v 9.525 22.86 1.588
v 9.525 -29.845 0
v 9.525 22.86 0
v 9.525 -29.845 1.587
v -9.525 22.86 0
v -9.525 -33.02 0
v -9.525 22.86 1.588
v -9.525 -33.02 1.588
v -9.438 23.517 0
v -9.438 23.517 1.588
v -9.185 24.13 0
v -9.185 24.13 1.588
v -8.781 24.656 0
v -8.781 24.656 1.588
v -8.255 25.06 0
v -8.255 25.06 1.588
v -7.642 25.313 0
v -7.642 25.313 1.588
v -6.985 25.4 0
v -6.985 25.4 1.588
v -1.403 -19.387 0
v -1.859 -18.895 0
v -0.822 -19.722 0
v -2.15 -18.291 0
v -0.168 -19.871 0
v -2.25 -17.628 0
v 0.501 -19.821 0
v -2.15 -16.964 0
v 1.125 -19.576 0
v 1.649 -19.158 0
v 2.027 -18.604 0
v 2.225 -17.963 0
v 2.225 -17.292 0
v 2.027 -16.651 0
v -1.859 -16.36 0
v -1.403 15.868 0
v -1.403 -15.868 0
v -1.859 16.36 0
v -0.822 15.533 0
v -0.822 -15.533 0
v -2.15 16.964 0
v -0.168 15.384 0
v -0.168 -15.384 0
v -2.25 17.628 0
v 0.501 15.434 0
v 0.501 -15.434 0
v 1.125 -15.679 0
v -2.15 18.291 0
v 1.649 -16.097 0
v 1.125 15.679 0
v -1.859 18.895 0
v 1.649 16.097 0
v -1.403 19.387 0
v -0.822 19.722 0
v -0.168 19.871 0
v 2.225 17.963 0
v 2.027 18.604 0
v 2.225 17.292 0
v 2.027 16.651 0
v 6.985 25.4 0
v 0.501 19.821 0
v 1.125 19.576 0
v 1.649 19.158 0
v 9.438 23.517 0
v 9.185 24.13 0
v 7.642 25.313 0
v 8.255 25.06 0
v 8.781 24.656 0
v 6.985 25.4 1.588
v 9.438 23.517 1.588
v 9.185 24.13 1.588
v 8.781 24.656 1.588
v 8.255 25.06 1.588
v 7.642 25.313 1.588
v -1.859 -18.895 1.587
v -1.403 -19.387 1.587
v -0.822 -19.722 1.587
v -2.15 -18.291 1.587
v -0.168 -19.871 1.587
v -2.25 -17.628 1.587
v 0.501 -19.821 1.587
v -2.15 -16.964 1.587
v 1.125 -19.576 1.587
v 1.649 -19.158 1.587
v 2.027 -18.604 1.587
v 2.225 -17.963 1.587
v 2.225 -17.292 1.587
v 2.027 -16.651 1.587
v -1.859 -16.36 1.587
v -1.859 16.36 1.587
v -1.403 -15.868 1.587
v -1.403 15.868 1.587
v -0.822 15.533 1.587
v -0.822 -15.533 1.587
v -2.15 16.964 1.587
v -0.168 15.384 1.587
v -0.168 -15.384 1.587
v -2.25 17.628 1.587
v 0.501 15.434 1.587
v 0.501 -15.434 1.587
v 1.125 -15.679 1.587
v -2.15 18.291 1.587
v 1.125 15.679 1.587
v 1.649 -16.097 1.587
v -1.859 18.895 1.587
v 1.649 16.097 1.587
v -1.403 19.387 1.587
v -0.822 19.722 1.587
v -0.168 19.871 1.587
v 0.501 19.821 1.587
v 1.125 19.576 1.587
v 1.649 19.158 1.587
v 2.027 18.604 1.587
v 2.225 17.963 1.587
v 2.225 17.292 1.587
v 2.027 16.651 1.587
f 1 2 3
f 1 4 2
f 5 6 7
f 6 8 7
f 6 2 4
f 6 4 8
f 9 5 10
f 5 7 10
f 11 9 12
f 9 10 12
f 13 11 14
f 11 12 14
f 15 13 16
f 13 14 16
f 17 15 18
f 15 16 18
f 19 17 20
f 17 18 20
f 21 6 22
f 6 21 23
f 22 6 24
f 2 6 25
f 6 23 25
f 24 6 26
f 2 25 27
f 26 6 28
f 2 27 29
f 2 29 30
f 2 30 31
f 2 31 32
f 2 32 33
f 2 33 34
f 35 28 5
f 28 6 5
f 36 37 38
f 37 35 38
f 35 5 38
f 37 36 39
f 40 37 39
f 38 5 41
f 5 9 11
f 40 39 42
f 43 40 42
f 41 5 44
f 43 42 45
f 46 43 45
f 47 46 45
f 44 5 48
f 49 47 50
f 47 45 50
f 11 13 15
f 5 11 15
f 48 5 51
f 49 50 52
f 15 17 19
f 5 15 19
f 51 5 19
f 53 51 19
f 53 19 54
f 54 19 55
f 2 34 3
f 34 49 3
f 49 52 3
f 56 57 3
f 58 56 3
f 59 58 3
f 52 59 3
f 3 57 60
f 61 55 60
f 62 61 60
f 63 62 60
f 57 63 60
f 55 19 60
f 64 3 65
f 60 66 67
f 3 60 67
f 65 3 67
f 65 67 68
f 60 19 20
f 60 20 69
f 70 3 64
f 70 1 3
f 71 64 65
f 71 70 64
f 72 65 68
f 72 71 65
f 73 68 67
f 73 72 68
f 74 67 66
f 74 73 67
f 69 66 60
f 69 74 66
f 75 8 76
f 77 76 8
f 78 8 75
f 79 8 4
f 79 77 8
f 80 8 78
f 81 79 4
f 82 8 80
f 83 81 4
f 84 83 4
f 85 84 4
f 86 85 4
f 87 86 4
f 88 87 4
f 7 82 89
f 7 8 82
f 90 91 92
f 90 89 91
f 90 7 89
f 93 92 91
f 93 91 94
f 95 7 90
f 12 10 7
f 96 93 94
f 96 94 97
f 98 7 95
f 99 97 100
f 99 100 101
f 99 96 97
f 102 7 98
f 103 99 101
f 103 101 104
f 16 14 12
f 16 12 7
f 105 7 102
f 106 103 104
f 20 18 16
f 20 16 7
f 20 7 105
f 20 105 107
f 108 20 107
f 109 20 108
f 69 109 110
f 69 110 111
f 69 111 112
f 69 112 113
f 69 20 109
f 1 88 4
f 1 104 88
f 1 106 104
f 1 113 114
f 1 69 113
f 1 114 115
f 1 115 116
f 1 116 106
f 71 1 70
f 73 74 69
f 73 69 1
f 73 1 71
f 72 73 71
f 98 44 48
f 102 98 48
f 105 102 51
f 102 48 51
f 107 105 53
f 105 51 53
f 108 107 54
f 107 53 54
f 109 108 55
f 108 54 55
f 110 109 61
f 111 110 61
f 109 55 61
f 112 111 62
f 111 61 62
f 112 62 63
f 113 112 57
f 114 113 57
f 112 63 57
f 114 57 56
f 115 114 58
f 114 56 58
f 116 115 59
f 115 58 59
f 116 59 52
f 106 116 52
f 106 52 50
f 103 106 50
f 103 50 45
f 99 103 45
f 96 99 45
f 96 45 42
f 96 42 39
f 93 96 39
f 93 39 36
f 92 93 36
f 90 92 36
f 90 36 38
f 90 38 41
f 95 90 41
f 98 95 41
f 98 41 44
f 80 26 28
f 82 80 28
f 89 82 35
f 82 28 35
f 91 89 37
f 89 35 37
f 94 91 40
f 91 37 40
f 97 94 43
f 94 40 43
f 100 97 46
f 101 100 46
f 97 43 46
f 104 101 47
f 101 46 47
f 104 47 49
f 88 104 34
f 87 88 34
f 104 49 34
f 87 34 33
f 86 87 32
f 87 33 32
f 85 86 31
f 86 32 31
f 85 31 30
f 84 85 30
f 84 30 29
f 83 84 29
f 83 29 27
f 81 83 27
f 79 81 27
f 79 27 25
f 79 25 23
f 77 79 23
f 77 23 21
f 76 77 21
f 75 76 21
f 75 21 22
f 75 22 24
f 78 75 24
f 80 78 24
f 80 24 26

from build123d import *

# Parameters (mm, degrees)
SKETCH1_W               = 19.05
SKETCH1_H               = 50.8
BOSS_EXTRUDE1_DEPTH     = 1.5875
M4_CLEARANCE_HOLE1_D    = 4.5
SKETCH4_W               = 19.05
SKETCH4_H               = 7.62
BOSS_EXTRUDE2_DEPTH     = 1.5875
FILLET1_R               = 2.54
CUT_EXTRUDE1_DEPTH      = 35.40299669
CUT_EXTRUDE1_DEPTH_BACK = 35.40299669


with BuildPart() as part:
    # Sketch1 → Boss-Extrude1 (new body)
    with BuildSketch(Plane.XY):
        Rectangle(SKETCH1_W, SKETCH1_H)
    extrude(amount=BOSS_EXTRUDE1_DEPTH)

    # M4 Clearance Hole1 (through all)
    with Locations(Plane.XY.offset(1.5875)):
        with Locations((0, 17.6276), (0, -17.6276)):
            Hole(M4_CLEARANCE_HOLE1_D / 2)

    # Sketch4 → Boss-Extrude2 (add)
    with BuildSketch(Plane.XY.offset(1.5875)):
        with Locations((0, -29.21)):
            Rectangle(SKETCH4_W, SKETCH4_H)
    extrude(amount=-BOSS_EXTRUDE2_DEPTH)

    # Fillet1
    fillet1_edges = [part.edges().sort_by_distance(p)[0] for p in [
        (-9.525, 25.4, 0.79375),
        (9.525, 25.4, 0.79375),
    ]]
    fillet(fillet1_edges, radius=FILLET1_R)

    # Sketch5 → Cut-Extrude1 (cut, two sides: drawn at the far end of the back side and taken through both)
    with BuildSketch(Plane.XY.offset(1.5875).offset(-CUT_EXTRUDE1_DEPTH_BACK)):
        Polygon((9.525, -29.845), (-9.525, -33.02), (9.525, -33.02), align=None)
    extrude(amount=CUT_EXTRUDE1_DEPTH + CUT_EXTRUDE1_DEPTH_BACK, mode=Mode.SUBTRACT)


solid = part.part
